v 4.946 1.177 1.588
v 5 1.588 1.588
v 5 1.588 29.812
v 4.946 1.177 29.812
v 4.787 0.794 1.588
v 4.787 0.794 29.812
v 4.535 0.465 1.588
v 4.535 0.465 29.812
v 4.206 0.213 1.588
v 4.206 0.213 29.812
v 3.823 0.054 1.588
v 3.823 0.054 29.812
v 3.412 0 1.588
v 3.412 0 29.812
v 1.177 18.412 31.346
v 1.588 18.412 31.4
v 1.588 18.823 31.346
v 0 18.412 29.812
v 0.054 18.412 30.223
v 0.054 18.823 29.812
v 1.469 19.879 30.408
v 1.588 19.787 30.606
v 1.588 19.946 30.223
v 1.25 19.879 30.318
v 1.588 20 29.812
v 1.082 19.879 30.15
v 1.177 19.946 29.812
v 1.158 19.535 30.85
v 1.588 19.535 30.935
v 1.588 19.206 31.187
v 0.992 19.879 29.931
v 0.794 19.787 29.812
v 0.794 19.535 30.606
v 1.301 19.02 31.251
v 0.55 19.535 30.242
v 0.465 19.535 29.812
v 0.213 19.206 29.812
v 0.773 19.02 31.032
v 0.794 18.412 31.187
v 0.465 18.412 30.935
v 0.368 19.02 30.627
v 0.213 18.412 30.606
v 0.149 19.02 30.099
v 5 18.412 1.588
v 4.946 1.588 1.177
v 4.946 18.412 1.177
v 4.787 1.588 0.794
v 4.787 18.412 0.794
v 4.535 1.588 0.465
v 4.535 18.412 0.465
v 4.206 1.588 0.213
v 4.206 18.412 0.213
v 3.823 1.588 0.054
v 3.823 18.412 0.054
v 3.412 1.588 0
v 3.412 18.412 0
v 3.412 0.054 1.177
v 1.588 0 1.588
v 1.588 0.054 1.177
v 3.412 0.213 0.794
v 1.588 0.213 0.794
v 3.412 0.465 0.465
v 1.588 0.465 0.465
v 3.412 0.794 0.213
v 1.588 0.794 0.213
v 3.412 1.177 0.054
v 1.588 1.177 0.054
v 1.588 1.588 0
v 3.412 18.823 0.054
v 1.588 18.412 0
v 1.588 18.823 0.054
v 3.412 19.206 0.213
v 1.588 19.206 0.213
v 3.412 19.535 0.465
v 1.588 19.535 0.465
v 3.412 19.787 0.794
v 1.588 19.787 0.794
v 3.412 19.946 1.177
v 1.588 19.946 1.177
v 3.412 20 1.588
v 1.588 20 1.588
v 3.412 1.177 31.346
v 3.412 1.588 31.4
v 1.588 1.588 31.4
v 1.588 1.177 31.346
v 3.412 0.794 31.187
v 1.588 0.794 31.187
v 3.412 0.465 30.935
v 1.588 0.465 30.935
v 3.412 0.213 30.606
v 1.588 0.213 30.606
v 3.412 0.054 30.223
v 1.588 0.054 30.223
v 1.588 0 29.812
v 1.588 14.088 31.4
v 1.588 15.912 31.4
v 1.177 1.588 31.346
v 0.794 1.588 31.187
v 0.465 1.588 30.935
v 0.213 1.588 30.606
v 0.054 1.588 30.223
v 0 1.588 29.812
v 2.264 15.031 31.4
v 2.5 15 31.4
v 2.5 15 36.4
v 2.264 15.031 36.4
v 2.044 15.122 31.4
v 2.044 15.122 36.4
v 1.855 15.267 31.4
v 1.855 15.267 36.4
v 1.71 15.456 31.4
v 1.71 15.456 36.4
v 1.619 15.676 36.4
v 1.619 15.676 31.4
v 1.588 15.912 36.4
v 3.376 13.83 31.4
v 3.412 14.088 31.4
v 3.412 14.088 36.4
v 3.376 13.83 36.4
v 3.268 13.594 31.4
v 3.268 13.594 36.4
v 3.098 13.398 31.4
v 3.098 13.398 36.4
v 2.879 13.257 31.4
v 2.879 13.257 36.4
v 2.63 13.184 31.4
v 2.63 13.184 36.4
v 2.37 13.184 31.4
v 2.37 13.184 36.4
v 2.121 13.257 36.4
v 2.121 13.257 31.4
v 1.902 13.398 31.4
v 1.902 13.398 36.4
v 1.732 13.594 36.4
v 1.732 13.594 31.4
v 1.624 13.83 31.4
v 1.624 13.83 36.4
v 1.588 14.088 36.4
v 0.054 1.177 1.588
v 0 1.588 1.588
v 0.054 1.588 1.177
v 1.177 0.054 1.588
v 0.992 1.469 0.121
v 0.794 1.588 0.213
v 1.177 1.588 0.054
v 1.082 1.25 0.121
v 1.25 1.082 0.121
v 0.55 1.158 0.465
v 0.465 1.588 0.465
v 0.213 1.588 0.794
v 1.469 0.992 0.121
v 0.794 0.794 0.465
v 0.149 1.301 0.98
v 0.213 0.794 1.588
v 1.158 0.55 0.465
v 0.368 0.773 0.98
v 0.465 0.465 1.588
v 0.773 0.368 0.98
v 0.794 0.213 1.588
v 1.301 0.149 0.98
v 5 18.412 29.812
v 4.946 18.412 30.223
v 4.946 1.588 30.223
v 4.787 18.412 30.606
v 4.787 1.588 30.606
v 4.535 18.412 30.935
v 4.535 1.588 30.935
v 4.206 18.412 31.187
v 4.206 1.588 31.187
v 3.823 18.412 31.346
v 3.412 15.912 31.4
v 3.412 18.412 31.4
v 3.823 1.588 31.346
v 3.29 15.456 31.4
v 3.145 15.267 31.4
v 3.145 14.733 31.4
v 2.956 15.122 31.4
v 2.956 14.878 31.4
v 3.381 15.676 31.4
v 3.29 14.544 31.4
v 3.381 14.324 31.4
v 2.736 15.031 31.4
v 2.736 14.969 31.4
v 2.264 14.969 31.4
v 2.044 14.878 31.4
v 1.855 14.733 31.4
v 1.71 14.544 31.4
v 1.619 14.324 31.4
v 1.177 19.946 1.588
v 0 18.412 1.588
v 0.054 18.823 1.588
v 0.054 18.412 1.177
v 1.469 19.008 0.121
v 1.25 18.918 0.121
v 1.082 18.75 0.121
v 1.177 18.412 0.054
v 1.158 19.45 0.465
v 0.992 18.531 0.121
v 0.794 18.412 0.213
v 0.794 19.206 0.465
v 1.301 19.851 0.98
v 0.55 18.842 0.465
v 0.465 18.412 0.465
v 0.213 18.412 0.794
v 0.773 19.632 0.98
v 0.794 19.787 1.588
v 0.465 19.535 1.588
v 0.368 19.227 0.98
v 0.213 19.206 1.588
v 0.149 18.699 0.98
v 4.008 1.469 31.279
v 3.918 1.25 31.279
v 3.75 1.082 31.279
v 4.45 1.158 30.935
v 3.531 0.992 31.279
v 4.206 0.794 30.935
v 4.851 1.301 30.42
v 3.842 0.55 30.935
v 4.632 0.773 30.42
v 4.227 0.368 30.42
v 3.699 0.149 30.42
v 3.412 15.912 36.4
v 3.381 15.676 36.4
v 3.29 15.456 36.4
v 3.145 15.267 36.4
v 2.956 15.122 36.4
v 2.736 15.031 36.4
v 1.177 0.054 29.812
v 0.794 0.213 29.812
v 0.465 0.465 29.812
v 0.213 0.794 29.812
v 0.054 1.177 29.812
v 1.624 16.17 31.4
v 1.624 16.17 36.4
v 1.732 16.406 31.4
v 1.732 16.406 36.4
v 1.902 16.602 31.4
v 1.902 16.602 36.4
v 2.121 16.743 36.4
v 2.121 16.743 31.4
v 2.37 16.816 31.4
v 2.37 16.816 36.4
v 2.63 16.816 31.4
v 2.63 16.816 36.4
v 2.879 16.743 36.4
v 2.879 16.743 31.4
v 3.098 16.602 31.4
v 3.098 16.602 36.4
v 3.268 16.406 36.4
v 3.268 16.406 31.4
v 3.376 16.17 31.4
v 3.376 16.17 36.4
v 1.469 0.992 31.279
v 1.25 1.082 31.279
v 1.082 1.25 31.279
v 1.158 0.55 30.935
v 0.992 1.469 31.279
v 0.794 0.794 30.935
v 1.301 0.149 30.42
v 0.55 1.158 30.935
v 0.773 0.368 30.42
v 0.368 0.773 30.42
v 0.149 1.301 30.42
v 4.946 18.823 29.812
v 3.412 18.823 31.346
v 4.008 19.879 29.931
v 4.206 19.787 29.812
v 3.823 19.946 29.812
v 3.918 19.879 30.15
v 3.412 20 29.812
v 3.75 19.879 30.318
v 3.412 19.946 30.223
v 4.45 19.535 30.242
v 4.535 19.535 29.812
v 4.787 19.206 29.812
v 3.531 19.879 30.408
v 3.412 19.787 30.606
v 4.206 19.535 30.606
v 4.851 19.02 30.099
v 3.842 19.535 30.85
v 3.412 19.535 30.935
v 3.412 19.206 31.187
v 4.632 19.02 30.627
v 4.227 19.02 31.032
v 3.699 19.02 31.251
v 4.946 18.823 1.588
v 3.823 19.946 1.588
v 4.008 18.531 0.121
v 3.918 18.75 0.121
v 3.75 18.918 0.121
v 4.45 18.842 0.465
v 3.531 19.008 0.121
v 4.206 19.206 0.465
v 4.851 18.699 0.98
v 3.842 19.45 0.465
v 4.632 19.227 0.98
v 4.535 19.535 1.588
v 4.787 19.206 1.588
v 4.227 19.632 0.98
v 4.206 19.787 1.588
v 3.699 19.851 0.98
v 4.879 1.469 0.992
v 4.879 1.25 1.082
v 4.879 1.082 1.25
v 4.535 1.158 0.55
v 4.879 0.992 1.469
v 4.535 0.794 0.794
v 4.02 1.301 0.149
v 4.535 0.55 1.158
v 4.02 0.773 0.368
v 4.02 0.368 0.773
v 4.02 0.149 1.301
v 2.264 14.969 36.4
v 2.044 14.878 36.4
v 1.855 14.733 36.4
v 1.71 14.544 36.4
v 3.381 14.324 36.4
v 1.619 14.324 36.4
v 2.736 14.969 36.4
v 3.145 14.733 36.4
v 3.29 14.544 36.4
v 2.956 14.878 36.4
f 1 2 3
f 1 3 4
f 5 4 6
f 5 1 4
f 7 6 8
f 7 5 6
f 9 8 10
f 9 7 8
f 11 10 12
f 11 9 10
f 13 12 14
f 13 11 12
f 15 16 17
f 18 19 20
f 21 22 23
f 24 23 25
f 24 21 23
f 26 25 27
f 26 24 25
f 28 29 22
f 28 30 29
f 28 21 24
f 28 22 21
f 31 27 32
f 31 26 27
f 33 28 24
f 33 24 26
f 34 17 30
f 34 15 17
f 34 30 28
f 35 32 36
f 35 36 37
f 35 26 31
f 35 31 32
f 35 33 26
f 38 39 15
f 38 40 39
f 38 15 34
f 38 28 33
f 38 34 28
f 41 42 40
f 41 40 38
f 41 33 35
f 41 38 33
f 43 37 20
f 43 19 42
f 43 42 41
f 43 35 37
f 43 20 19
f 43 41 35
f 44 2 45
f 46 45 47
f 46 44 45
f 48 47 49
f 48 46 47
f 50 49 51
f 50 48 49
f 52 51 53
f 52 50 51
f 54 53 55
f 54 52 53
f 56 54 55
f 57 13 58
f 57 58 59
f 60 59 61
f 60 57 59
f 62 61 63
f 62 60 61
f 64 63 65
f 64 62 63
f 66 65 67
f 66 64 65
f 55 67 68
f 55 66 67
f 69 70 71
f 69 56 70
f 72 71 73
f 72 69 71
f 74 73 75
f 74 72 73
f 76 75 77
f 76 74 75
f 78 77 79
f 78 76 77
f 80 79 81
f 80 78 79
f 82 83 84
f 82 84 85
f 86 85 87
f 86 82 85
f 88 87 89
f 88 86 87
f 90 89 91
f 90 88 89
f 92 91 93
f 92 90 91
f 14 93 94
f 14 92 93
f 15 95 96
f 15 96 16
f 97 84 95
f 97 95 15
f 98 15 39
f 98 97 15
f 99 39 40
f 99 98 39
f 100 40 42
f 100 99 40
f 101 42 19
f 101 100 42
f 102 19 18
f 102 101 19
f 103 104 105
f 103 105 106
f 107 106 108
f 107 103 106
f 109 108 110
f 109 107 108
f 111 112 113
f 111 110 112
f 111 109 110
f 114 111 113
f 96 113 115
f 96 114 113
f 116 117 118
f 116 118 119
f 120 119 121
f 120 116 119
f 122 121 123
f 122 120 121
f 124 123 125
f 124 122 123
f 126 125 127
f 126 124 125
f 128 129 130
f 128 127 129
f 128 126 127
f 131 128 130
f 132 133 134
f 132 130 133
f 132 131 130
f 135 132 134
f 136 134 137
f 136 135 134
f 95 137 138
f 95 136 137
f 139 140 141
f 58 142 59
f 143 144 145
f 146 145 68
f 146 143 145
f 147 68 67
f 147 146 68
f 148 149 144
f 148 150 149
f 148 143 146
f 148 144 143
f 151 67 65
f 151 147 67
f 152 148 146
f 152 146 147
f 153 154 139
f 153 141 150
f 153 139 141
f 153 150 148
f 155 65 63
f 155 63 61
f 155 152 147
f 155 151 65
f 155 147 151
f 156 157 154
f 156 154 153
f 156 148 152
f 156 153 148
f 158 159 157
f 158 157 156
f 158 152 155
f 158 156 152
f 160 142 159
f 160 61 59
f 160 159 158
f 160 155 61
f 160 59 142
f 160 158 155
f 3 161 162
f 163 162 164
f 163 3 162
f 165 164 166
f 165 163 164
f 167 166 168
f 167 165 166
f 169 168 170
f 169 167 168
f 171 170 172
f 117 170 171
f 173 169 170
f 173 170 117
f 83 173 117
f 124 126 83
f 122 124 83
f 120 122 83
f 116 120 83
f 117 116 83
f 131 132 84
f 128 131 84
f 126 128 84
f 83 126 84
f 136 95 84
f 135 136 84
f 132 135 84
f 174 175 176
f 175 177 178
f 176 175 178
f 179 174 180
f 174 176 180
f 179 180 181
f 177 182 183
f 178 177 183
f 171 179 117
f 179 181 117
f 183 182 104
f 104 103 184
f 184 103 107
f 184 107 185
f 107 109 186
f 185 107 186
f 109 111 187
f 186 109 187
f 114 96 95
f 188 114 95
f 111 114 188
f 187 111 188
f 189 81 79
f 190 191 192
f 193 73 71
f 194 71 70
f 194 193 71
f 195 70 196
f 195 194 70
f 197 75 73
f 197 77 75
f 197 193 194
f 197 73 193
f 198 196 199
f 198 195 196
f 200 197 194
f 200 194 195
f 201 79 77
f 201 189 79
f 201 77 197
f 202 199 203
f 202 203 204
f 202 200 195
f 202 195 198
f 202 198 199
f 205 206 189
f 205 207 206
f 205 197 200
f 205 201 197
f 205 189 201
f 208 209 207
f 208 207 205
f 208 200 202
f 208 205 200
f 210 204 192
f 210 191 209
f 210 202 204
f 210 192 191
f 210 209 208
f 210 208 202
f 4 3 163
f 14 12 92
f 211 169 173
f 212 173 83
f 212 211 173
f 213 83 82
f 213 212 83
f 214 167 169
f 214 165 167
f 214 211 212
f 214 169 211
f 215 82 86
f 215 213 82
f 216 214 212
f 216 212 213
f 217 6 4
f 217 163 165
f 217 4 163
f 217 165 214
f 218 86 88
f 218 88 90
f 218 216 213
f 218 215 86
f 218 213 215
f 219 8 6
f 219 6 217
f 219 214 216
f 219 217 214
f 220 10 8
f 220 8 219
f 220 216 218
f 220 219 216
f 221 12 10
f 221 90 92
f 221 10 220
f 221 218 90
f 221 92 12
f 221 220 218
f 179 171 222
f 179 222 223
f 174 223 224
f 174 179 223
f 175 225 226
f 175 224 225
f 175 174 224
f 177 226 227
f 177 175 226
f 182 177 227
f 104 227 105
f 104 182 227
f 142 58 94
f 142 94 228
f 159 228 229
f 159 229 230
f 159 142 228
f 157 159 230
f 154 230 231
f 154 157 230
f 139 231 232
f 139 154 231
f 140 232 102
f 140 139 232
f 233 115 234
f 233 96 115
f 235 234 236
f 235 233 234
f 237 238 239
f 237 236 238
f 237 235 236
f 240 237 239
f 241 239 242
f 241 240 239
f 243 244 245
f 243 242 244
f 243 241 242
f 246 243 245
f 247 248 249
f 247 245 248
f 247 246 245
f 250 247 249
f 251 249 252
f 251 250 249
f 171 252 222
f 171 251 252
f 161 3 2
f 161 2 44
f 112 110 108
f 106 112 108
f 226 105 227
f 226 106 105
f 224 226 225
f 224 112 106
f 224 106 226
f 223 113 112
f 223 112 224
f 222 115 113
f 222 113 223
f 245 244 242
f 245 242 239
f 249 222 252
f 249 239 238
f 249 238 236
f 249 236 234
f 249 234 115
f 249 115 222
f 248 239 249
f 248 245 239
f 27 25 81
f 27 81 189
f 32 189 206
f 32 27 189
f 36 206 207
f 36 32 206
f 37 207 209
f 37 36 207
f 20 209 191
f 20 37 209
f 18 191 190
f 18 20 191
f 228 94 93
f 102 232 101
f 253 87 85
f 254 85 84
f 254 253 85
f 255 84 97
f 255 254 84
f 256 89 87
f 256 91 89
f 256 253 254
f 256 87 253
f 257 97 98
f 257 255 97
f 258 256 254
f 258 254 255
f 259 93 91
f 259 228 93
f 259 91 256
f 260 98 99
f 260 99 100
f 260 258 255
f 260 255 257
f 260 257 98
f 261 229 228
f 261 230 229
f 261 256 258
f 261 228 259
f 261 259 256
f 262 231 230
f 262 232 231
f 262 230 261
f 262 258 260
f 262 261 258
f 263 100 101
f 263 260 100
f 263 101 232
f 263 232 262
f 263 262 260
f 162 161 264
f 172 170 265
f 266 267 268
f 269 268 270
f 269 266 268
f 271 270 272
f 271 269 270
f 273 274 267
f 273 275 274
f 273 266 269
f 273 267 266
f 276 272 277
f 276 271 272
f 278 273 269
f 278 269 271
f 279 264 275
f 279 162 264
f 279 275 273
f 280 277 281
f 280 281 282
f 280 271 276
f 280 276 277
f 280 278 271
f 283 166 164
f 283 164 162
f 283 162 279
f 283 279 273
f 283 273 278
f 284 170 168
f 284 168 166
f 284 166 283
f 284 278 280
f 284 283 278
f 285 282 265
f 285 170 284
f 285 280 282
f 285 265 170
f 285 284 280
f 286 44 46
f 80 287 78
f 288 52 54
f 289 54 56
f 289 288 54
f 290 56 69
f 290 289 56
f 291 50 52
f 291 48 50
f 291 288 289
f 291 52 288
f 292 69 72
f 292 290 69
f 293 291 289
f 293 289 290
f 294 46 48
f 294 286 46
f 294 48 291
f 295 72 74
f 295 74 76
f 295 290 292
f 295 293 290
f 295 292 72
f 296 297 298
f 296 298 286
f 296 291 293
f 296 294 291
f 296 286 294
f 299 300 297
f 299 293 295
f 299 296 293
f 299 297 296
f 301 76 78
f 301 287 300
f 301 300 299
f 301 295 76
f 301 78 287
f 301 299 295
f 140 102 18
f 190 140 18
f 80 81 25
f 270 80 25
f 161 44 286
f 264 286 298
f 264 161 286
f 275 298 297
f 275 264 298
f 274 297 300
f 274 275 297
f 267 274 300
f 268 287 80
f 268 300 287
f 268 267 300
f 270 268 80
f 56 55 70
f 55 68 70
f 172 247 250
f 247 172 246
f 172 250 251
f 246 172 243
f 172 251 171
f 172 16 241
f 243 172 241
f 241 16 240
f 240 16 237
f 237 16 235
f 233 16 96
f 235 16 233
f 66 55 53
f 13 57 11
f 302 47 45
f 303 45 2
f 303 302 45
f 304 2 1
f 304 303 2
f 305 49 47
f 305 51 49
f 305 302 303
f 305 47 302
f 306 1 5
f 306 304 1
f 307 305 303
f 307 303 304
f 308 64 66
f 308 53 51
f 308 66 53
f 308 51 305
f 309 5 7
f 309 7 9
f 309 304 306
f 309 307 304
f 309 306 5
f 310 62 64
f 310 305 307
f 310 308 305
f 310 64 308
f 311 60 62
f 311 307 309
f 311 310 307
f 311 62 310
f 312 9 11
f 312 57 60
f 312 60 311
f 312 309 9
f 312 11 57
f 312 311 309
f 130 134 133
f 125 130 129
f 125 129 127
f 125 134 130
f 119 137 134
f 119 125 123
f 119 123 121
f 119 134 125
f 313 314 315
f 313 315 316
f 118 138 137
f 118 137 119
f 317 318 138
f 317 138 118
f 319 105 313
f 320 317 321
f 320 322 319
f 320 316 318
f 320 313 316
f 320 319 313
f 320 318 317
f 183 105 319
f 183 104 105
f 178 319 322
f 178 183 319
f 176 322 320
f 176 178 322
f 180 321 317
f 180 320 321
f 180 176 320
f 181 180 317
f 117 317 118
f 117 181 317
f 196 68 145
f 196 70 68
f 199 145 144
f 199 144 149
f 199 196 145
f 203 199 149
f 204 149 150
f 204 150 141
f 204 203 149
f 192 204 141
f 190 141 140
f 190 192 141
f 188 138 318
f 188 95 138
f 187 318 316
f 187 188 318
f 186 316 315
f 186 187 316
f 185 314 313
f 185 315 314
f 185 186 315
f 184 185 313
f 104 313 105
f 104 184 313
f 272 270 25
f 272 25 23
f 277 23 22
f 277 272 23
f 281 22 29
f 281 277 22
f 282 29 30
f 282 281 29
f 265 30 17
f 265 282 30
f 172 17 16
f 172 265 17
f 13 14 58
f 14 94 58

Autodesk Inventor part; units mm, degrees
ref_plane "YZ Plane" through (0, 0, 0) normal (1, 0, 0) x (0, 1, 0)
ref_plane "XZ Plane" through (0, 0, 0) normal (0, 1, 0) x (-1, 0, 0)
ref_plane "XY Plane" through (0, 0, 0) normal (0, 0, 1) x (1, 0, 0)
sketch "Sketch1" plane through (0, 0, 0) normal (1, 0, 0) x (0, 1, 0)
  line L0 (0, 0) -> (20, 0)
  line L1 (20, 0) -> (20, 31.4)
  line L2 (20, 31.4) -> (0, 31.4)
  line L3 (0, 31.4) -> (0, 0)
  dimension "d0" = 20
  dimension "d1" = 31.4
extrude "Extrusion1" add sketch "Sketch1" along normal blind 5
fillet "Fillet1" radius 1.5875 12 edges at (0, 0, 15.7) (2.5, 0, 0) (5, 0, 15.7) (2.5, 0, 31.4) (0, 10, 31.4) (5, 10, 31.4) (2.5, 20, 31.4) (0, 20, 15.7) (5, 20, 15.7) (2.5, 20, 0) (0, 10, 0) (5, 10, 0)
sketch "Sketch2" plane through (1.5875, 1.5875, 31.4) normal (0, 0, 1) x (1, 0, 0)
  line L0 (0, 0) -> (0, 16.825) projected
  line L1 (1.825, 0) -> (0, 0) projected
  line L2 (1.825, 16.825) -> (1.825, 0) projected
  circle A0 centre (0.9125, 14.325) radius 0.9125
  circle A1 centre (0.9125, 12.5) radius 0.9125
  point P0 (-1.5875, -1.5875)
  dimension "d5" = 12.5
extrude "Extrusion2" add sketch "Sketch2" along normal blind 5 contours A1 | A0
properties part number "adafruit 500mAh battery"
